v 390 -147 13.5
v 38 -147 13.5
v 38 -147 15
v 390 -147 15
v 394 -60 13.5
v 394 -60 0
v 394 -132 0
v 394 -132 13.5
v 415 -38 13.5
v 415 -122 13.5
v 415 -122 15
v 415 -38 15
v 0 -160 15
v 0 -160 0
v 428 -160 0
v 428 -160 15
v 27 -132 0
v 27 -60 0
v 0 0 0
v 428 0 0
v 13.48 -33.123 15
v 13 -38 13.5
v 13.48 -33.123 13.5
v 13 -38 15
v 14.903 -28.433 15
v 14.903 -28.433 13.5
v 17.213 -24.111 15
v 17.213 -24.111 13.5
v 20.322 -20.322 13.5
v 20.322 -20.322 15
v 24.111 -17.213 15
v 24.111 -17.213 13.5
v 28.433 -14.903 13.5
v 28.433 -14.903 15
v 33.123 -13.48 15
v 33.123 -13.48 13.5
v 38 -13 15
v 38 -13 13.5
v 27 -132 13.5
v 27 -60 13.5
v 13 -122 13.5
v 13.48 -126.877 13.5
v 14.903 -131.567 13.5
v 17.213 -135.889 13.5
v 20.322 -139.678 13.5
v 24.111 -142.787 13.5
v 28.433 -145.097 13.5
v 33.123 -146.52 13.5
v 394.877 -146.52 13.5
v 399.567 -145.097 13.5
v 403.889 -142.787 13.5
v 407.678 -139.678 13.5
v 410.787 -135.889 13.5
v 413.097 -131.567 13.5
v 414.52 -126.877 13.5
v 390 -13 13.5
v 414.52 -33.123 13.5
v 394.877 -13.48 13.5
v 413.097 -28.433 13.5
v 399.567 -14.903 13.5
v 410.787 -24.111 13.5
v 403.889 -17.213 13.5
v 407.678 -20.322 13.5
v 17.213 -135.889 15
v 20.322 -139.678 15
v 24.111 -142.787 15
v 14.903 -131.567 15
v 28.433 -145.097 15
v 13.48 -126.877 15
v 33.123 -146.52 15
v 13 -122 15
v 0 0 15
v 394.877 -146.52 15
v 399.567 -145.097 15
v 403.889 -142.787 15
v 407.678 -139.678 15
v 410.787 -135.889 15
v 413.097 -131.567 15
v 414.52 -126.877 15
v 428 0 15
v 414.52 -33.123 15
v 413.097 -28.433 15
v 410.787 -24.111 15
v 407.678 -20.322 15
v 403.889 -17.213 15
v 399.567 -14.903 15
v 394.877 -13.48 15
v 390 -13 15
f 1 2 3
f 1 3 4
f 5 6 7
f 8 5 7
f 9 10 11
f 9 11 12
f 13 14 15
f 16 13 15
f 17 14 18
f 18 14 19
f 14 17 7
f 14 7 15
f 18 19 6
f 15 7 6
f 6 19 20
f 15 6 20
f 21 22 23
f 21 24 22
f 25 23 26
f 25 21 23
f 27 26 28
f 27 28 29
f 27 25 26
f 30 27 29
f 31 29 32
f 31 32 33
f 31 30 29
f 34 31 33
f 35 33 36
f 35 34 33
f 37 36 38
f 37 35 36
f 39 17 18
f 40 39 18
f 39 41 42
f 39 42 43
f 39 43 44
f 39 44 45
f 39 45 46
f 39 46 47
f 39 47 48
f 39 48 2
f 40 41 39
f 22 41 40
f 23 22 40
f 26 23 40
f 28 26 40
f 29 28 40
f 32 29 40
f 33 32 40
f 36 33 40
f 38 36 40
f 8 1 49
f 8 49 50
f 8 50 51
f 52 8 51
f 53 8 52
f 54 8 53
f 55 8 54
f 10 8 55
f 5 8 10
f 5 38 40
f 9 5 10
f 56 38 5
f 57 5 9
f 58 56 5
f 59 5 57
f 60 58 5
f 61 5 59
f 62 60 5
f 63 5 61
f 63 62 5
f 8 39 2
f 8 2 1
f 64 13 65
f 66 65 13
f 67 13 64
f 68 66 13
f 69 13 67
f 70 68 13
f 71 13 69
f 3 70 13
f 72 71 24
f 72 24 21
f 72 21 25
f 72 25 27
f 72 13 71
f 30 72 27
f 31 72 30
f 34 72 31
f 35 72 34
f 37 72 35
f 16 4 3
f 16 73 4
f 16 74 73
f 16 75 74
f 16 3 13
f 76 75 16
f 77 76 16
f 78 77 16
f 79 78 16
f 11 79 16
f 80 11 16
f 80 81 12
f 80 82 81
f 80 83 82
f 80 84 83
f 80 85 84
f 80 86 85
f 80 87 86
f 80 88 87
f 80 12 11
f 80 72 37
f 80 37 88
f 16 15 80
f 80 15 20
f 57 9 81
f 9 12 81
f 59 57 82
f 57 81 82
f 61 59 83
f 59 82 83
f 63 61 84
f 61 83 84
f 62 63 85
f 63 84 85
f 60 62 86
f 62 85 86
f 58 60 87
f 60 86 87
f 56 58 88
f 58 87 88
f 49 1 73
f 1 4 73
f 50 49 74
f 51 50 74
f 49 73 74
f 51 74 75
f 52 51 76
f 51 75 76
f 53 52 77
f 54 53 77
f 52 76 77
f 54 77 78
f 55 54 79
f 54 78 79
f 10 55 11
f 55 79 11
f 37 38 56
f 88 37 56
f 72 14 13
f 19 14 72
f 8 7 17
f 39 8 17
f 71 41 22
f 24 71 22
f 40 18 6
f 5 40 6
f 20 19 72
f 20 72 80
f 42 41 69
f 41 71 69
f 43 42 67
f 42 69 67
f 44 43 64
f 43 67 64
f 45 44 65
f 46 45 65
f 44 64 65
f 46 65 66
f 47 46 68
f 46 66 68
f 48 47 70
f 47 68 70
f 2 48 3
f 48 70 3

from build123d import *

# Parameters (mm, degrees)
F0_W     = 428
F0_H     = 160
F0_W_2   = 402
F0_H_2   = 134
F1_DEPTH = 15
F2_DEPTH = 13.5
F3_R     = 25


with BuildPart() as f1:
    # F0 (on Top) → F1 (new body)
    with BuildSketch(Plane.XY):
        with Locations((214, -80)):
            Rectangle(F0_W, F0_H)
        with Locations((214, -80)):
            Rectangle(F0_W_2, F0_H_2, mode=Mode.SUBTRACT)
    extrude(amount=F1_DEPTH)

    # F0 (on Top) → F2 (join)
    with BuildSketch(Plane.XY):
        with Locations((214, -80)):
            Rectangle(F0_W_2, F0_H_2)
        Polygon((394, -132), (214, -132), (27, -132), (27, -60), (214, -60), (394, -60), align=None, mode=Mode.SUBTRACT)
    extrude(amount=F2_DEPTH)

    # F3
    f3_edges = [f1.edges().sort_by_distance(p)[0] for p in [
        (13, -13, 14.25),
        (13, -147, 14.25),
        (415, -13, 14.25),
        (415, -147, 14.25),
    ]]
    fillet(f3_edges, radius=F3_R)


solid = f1.part
